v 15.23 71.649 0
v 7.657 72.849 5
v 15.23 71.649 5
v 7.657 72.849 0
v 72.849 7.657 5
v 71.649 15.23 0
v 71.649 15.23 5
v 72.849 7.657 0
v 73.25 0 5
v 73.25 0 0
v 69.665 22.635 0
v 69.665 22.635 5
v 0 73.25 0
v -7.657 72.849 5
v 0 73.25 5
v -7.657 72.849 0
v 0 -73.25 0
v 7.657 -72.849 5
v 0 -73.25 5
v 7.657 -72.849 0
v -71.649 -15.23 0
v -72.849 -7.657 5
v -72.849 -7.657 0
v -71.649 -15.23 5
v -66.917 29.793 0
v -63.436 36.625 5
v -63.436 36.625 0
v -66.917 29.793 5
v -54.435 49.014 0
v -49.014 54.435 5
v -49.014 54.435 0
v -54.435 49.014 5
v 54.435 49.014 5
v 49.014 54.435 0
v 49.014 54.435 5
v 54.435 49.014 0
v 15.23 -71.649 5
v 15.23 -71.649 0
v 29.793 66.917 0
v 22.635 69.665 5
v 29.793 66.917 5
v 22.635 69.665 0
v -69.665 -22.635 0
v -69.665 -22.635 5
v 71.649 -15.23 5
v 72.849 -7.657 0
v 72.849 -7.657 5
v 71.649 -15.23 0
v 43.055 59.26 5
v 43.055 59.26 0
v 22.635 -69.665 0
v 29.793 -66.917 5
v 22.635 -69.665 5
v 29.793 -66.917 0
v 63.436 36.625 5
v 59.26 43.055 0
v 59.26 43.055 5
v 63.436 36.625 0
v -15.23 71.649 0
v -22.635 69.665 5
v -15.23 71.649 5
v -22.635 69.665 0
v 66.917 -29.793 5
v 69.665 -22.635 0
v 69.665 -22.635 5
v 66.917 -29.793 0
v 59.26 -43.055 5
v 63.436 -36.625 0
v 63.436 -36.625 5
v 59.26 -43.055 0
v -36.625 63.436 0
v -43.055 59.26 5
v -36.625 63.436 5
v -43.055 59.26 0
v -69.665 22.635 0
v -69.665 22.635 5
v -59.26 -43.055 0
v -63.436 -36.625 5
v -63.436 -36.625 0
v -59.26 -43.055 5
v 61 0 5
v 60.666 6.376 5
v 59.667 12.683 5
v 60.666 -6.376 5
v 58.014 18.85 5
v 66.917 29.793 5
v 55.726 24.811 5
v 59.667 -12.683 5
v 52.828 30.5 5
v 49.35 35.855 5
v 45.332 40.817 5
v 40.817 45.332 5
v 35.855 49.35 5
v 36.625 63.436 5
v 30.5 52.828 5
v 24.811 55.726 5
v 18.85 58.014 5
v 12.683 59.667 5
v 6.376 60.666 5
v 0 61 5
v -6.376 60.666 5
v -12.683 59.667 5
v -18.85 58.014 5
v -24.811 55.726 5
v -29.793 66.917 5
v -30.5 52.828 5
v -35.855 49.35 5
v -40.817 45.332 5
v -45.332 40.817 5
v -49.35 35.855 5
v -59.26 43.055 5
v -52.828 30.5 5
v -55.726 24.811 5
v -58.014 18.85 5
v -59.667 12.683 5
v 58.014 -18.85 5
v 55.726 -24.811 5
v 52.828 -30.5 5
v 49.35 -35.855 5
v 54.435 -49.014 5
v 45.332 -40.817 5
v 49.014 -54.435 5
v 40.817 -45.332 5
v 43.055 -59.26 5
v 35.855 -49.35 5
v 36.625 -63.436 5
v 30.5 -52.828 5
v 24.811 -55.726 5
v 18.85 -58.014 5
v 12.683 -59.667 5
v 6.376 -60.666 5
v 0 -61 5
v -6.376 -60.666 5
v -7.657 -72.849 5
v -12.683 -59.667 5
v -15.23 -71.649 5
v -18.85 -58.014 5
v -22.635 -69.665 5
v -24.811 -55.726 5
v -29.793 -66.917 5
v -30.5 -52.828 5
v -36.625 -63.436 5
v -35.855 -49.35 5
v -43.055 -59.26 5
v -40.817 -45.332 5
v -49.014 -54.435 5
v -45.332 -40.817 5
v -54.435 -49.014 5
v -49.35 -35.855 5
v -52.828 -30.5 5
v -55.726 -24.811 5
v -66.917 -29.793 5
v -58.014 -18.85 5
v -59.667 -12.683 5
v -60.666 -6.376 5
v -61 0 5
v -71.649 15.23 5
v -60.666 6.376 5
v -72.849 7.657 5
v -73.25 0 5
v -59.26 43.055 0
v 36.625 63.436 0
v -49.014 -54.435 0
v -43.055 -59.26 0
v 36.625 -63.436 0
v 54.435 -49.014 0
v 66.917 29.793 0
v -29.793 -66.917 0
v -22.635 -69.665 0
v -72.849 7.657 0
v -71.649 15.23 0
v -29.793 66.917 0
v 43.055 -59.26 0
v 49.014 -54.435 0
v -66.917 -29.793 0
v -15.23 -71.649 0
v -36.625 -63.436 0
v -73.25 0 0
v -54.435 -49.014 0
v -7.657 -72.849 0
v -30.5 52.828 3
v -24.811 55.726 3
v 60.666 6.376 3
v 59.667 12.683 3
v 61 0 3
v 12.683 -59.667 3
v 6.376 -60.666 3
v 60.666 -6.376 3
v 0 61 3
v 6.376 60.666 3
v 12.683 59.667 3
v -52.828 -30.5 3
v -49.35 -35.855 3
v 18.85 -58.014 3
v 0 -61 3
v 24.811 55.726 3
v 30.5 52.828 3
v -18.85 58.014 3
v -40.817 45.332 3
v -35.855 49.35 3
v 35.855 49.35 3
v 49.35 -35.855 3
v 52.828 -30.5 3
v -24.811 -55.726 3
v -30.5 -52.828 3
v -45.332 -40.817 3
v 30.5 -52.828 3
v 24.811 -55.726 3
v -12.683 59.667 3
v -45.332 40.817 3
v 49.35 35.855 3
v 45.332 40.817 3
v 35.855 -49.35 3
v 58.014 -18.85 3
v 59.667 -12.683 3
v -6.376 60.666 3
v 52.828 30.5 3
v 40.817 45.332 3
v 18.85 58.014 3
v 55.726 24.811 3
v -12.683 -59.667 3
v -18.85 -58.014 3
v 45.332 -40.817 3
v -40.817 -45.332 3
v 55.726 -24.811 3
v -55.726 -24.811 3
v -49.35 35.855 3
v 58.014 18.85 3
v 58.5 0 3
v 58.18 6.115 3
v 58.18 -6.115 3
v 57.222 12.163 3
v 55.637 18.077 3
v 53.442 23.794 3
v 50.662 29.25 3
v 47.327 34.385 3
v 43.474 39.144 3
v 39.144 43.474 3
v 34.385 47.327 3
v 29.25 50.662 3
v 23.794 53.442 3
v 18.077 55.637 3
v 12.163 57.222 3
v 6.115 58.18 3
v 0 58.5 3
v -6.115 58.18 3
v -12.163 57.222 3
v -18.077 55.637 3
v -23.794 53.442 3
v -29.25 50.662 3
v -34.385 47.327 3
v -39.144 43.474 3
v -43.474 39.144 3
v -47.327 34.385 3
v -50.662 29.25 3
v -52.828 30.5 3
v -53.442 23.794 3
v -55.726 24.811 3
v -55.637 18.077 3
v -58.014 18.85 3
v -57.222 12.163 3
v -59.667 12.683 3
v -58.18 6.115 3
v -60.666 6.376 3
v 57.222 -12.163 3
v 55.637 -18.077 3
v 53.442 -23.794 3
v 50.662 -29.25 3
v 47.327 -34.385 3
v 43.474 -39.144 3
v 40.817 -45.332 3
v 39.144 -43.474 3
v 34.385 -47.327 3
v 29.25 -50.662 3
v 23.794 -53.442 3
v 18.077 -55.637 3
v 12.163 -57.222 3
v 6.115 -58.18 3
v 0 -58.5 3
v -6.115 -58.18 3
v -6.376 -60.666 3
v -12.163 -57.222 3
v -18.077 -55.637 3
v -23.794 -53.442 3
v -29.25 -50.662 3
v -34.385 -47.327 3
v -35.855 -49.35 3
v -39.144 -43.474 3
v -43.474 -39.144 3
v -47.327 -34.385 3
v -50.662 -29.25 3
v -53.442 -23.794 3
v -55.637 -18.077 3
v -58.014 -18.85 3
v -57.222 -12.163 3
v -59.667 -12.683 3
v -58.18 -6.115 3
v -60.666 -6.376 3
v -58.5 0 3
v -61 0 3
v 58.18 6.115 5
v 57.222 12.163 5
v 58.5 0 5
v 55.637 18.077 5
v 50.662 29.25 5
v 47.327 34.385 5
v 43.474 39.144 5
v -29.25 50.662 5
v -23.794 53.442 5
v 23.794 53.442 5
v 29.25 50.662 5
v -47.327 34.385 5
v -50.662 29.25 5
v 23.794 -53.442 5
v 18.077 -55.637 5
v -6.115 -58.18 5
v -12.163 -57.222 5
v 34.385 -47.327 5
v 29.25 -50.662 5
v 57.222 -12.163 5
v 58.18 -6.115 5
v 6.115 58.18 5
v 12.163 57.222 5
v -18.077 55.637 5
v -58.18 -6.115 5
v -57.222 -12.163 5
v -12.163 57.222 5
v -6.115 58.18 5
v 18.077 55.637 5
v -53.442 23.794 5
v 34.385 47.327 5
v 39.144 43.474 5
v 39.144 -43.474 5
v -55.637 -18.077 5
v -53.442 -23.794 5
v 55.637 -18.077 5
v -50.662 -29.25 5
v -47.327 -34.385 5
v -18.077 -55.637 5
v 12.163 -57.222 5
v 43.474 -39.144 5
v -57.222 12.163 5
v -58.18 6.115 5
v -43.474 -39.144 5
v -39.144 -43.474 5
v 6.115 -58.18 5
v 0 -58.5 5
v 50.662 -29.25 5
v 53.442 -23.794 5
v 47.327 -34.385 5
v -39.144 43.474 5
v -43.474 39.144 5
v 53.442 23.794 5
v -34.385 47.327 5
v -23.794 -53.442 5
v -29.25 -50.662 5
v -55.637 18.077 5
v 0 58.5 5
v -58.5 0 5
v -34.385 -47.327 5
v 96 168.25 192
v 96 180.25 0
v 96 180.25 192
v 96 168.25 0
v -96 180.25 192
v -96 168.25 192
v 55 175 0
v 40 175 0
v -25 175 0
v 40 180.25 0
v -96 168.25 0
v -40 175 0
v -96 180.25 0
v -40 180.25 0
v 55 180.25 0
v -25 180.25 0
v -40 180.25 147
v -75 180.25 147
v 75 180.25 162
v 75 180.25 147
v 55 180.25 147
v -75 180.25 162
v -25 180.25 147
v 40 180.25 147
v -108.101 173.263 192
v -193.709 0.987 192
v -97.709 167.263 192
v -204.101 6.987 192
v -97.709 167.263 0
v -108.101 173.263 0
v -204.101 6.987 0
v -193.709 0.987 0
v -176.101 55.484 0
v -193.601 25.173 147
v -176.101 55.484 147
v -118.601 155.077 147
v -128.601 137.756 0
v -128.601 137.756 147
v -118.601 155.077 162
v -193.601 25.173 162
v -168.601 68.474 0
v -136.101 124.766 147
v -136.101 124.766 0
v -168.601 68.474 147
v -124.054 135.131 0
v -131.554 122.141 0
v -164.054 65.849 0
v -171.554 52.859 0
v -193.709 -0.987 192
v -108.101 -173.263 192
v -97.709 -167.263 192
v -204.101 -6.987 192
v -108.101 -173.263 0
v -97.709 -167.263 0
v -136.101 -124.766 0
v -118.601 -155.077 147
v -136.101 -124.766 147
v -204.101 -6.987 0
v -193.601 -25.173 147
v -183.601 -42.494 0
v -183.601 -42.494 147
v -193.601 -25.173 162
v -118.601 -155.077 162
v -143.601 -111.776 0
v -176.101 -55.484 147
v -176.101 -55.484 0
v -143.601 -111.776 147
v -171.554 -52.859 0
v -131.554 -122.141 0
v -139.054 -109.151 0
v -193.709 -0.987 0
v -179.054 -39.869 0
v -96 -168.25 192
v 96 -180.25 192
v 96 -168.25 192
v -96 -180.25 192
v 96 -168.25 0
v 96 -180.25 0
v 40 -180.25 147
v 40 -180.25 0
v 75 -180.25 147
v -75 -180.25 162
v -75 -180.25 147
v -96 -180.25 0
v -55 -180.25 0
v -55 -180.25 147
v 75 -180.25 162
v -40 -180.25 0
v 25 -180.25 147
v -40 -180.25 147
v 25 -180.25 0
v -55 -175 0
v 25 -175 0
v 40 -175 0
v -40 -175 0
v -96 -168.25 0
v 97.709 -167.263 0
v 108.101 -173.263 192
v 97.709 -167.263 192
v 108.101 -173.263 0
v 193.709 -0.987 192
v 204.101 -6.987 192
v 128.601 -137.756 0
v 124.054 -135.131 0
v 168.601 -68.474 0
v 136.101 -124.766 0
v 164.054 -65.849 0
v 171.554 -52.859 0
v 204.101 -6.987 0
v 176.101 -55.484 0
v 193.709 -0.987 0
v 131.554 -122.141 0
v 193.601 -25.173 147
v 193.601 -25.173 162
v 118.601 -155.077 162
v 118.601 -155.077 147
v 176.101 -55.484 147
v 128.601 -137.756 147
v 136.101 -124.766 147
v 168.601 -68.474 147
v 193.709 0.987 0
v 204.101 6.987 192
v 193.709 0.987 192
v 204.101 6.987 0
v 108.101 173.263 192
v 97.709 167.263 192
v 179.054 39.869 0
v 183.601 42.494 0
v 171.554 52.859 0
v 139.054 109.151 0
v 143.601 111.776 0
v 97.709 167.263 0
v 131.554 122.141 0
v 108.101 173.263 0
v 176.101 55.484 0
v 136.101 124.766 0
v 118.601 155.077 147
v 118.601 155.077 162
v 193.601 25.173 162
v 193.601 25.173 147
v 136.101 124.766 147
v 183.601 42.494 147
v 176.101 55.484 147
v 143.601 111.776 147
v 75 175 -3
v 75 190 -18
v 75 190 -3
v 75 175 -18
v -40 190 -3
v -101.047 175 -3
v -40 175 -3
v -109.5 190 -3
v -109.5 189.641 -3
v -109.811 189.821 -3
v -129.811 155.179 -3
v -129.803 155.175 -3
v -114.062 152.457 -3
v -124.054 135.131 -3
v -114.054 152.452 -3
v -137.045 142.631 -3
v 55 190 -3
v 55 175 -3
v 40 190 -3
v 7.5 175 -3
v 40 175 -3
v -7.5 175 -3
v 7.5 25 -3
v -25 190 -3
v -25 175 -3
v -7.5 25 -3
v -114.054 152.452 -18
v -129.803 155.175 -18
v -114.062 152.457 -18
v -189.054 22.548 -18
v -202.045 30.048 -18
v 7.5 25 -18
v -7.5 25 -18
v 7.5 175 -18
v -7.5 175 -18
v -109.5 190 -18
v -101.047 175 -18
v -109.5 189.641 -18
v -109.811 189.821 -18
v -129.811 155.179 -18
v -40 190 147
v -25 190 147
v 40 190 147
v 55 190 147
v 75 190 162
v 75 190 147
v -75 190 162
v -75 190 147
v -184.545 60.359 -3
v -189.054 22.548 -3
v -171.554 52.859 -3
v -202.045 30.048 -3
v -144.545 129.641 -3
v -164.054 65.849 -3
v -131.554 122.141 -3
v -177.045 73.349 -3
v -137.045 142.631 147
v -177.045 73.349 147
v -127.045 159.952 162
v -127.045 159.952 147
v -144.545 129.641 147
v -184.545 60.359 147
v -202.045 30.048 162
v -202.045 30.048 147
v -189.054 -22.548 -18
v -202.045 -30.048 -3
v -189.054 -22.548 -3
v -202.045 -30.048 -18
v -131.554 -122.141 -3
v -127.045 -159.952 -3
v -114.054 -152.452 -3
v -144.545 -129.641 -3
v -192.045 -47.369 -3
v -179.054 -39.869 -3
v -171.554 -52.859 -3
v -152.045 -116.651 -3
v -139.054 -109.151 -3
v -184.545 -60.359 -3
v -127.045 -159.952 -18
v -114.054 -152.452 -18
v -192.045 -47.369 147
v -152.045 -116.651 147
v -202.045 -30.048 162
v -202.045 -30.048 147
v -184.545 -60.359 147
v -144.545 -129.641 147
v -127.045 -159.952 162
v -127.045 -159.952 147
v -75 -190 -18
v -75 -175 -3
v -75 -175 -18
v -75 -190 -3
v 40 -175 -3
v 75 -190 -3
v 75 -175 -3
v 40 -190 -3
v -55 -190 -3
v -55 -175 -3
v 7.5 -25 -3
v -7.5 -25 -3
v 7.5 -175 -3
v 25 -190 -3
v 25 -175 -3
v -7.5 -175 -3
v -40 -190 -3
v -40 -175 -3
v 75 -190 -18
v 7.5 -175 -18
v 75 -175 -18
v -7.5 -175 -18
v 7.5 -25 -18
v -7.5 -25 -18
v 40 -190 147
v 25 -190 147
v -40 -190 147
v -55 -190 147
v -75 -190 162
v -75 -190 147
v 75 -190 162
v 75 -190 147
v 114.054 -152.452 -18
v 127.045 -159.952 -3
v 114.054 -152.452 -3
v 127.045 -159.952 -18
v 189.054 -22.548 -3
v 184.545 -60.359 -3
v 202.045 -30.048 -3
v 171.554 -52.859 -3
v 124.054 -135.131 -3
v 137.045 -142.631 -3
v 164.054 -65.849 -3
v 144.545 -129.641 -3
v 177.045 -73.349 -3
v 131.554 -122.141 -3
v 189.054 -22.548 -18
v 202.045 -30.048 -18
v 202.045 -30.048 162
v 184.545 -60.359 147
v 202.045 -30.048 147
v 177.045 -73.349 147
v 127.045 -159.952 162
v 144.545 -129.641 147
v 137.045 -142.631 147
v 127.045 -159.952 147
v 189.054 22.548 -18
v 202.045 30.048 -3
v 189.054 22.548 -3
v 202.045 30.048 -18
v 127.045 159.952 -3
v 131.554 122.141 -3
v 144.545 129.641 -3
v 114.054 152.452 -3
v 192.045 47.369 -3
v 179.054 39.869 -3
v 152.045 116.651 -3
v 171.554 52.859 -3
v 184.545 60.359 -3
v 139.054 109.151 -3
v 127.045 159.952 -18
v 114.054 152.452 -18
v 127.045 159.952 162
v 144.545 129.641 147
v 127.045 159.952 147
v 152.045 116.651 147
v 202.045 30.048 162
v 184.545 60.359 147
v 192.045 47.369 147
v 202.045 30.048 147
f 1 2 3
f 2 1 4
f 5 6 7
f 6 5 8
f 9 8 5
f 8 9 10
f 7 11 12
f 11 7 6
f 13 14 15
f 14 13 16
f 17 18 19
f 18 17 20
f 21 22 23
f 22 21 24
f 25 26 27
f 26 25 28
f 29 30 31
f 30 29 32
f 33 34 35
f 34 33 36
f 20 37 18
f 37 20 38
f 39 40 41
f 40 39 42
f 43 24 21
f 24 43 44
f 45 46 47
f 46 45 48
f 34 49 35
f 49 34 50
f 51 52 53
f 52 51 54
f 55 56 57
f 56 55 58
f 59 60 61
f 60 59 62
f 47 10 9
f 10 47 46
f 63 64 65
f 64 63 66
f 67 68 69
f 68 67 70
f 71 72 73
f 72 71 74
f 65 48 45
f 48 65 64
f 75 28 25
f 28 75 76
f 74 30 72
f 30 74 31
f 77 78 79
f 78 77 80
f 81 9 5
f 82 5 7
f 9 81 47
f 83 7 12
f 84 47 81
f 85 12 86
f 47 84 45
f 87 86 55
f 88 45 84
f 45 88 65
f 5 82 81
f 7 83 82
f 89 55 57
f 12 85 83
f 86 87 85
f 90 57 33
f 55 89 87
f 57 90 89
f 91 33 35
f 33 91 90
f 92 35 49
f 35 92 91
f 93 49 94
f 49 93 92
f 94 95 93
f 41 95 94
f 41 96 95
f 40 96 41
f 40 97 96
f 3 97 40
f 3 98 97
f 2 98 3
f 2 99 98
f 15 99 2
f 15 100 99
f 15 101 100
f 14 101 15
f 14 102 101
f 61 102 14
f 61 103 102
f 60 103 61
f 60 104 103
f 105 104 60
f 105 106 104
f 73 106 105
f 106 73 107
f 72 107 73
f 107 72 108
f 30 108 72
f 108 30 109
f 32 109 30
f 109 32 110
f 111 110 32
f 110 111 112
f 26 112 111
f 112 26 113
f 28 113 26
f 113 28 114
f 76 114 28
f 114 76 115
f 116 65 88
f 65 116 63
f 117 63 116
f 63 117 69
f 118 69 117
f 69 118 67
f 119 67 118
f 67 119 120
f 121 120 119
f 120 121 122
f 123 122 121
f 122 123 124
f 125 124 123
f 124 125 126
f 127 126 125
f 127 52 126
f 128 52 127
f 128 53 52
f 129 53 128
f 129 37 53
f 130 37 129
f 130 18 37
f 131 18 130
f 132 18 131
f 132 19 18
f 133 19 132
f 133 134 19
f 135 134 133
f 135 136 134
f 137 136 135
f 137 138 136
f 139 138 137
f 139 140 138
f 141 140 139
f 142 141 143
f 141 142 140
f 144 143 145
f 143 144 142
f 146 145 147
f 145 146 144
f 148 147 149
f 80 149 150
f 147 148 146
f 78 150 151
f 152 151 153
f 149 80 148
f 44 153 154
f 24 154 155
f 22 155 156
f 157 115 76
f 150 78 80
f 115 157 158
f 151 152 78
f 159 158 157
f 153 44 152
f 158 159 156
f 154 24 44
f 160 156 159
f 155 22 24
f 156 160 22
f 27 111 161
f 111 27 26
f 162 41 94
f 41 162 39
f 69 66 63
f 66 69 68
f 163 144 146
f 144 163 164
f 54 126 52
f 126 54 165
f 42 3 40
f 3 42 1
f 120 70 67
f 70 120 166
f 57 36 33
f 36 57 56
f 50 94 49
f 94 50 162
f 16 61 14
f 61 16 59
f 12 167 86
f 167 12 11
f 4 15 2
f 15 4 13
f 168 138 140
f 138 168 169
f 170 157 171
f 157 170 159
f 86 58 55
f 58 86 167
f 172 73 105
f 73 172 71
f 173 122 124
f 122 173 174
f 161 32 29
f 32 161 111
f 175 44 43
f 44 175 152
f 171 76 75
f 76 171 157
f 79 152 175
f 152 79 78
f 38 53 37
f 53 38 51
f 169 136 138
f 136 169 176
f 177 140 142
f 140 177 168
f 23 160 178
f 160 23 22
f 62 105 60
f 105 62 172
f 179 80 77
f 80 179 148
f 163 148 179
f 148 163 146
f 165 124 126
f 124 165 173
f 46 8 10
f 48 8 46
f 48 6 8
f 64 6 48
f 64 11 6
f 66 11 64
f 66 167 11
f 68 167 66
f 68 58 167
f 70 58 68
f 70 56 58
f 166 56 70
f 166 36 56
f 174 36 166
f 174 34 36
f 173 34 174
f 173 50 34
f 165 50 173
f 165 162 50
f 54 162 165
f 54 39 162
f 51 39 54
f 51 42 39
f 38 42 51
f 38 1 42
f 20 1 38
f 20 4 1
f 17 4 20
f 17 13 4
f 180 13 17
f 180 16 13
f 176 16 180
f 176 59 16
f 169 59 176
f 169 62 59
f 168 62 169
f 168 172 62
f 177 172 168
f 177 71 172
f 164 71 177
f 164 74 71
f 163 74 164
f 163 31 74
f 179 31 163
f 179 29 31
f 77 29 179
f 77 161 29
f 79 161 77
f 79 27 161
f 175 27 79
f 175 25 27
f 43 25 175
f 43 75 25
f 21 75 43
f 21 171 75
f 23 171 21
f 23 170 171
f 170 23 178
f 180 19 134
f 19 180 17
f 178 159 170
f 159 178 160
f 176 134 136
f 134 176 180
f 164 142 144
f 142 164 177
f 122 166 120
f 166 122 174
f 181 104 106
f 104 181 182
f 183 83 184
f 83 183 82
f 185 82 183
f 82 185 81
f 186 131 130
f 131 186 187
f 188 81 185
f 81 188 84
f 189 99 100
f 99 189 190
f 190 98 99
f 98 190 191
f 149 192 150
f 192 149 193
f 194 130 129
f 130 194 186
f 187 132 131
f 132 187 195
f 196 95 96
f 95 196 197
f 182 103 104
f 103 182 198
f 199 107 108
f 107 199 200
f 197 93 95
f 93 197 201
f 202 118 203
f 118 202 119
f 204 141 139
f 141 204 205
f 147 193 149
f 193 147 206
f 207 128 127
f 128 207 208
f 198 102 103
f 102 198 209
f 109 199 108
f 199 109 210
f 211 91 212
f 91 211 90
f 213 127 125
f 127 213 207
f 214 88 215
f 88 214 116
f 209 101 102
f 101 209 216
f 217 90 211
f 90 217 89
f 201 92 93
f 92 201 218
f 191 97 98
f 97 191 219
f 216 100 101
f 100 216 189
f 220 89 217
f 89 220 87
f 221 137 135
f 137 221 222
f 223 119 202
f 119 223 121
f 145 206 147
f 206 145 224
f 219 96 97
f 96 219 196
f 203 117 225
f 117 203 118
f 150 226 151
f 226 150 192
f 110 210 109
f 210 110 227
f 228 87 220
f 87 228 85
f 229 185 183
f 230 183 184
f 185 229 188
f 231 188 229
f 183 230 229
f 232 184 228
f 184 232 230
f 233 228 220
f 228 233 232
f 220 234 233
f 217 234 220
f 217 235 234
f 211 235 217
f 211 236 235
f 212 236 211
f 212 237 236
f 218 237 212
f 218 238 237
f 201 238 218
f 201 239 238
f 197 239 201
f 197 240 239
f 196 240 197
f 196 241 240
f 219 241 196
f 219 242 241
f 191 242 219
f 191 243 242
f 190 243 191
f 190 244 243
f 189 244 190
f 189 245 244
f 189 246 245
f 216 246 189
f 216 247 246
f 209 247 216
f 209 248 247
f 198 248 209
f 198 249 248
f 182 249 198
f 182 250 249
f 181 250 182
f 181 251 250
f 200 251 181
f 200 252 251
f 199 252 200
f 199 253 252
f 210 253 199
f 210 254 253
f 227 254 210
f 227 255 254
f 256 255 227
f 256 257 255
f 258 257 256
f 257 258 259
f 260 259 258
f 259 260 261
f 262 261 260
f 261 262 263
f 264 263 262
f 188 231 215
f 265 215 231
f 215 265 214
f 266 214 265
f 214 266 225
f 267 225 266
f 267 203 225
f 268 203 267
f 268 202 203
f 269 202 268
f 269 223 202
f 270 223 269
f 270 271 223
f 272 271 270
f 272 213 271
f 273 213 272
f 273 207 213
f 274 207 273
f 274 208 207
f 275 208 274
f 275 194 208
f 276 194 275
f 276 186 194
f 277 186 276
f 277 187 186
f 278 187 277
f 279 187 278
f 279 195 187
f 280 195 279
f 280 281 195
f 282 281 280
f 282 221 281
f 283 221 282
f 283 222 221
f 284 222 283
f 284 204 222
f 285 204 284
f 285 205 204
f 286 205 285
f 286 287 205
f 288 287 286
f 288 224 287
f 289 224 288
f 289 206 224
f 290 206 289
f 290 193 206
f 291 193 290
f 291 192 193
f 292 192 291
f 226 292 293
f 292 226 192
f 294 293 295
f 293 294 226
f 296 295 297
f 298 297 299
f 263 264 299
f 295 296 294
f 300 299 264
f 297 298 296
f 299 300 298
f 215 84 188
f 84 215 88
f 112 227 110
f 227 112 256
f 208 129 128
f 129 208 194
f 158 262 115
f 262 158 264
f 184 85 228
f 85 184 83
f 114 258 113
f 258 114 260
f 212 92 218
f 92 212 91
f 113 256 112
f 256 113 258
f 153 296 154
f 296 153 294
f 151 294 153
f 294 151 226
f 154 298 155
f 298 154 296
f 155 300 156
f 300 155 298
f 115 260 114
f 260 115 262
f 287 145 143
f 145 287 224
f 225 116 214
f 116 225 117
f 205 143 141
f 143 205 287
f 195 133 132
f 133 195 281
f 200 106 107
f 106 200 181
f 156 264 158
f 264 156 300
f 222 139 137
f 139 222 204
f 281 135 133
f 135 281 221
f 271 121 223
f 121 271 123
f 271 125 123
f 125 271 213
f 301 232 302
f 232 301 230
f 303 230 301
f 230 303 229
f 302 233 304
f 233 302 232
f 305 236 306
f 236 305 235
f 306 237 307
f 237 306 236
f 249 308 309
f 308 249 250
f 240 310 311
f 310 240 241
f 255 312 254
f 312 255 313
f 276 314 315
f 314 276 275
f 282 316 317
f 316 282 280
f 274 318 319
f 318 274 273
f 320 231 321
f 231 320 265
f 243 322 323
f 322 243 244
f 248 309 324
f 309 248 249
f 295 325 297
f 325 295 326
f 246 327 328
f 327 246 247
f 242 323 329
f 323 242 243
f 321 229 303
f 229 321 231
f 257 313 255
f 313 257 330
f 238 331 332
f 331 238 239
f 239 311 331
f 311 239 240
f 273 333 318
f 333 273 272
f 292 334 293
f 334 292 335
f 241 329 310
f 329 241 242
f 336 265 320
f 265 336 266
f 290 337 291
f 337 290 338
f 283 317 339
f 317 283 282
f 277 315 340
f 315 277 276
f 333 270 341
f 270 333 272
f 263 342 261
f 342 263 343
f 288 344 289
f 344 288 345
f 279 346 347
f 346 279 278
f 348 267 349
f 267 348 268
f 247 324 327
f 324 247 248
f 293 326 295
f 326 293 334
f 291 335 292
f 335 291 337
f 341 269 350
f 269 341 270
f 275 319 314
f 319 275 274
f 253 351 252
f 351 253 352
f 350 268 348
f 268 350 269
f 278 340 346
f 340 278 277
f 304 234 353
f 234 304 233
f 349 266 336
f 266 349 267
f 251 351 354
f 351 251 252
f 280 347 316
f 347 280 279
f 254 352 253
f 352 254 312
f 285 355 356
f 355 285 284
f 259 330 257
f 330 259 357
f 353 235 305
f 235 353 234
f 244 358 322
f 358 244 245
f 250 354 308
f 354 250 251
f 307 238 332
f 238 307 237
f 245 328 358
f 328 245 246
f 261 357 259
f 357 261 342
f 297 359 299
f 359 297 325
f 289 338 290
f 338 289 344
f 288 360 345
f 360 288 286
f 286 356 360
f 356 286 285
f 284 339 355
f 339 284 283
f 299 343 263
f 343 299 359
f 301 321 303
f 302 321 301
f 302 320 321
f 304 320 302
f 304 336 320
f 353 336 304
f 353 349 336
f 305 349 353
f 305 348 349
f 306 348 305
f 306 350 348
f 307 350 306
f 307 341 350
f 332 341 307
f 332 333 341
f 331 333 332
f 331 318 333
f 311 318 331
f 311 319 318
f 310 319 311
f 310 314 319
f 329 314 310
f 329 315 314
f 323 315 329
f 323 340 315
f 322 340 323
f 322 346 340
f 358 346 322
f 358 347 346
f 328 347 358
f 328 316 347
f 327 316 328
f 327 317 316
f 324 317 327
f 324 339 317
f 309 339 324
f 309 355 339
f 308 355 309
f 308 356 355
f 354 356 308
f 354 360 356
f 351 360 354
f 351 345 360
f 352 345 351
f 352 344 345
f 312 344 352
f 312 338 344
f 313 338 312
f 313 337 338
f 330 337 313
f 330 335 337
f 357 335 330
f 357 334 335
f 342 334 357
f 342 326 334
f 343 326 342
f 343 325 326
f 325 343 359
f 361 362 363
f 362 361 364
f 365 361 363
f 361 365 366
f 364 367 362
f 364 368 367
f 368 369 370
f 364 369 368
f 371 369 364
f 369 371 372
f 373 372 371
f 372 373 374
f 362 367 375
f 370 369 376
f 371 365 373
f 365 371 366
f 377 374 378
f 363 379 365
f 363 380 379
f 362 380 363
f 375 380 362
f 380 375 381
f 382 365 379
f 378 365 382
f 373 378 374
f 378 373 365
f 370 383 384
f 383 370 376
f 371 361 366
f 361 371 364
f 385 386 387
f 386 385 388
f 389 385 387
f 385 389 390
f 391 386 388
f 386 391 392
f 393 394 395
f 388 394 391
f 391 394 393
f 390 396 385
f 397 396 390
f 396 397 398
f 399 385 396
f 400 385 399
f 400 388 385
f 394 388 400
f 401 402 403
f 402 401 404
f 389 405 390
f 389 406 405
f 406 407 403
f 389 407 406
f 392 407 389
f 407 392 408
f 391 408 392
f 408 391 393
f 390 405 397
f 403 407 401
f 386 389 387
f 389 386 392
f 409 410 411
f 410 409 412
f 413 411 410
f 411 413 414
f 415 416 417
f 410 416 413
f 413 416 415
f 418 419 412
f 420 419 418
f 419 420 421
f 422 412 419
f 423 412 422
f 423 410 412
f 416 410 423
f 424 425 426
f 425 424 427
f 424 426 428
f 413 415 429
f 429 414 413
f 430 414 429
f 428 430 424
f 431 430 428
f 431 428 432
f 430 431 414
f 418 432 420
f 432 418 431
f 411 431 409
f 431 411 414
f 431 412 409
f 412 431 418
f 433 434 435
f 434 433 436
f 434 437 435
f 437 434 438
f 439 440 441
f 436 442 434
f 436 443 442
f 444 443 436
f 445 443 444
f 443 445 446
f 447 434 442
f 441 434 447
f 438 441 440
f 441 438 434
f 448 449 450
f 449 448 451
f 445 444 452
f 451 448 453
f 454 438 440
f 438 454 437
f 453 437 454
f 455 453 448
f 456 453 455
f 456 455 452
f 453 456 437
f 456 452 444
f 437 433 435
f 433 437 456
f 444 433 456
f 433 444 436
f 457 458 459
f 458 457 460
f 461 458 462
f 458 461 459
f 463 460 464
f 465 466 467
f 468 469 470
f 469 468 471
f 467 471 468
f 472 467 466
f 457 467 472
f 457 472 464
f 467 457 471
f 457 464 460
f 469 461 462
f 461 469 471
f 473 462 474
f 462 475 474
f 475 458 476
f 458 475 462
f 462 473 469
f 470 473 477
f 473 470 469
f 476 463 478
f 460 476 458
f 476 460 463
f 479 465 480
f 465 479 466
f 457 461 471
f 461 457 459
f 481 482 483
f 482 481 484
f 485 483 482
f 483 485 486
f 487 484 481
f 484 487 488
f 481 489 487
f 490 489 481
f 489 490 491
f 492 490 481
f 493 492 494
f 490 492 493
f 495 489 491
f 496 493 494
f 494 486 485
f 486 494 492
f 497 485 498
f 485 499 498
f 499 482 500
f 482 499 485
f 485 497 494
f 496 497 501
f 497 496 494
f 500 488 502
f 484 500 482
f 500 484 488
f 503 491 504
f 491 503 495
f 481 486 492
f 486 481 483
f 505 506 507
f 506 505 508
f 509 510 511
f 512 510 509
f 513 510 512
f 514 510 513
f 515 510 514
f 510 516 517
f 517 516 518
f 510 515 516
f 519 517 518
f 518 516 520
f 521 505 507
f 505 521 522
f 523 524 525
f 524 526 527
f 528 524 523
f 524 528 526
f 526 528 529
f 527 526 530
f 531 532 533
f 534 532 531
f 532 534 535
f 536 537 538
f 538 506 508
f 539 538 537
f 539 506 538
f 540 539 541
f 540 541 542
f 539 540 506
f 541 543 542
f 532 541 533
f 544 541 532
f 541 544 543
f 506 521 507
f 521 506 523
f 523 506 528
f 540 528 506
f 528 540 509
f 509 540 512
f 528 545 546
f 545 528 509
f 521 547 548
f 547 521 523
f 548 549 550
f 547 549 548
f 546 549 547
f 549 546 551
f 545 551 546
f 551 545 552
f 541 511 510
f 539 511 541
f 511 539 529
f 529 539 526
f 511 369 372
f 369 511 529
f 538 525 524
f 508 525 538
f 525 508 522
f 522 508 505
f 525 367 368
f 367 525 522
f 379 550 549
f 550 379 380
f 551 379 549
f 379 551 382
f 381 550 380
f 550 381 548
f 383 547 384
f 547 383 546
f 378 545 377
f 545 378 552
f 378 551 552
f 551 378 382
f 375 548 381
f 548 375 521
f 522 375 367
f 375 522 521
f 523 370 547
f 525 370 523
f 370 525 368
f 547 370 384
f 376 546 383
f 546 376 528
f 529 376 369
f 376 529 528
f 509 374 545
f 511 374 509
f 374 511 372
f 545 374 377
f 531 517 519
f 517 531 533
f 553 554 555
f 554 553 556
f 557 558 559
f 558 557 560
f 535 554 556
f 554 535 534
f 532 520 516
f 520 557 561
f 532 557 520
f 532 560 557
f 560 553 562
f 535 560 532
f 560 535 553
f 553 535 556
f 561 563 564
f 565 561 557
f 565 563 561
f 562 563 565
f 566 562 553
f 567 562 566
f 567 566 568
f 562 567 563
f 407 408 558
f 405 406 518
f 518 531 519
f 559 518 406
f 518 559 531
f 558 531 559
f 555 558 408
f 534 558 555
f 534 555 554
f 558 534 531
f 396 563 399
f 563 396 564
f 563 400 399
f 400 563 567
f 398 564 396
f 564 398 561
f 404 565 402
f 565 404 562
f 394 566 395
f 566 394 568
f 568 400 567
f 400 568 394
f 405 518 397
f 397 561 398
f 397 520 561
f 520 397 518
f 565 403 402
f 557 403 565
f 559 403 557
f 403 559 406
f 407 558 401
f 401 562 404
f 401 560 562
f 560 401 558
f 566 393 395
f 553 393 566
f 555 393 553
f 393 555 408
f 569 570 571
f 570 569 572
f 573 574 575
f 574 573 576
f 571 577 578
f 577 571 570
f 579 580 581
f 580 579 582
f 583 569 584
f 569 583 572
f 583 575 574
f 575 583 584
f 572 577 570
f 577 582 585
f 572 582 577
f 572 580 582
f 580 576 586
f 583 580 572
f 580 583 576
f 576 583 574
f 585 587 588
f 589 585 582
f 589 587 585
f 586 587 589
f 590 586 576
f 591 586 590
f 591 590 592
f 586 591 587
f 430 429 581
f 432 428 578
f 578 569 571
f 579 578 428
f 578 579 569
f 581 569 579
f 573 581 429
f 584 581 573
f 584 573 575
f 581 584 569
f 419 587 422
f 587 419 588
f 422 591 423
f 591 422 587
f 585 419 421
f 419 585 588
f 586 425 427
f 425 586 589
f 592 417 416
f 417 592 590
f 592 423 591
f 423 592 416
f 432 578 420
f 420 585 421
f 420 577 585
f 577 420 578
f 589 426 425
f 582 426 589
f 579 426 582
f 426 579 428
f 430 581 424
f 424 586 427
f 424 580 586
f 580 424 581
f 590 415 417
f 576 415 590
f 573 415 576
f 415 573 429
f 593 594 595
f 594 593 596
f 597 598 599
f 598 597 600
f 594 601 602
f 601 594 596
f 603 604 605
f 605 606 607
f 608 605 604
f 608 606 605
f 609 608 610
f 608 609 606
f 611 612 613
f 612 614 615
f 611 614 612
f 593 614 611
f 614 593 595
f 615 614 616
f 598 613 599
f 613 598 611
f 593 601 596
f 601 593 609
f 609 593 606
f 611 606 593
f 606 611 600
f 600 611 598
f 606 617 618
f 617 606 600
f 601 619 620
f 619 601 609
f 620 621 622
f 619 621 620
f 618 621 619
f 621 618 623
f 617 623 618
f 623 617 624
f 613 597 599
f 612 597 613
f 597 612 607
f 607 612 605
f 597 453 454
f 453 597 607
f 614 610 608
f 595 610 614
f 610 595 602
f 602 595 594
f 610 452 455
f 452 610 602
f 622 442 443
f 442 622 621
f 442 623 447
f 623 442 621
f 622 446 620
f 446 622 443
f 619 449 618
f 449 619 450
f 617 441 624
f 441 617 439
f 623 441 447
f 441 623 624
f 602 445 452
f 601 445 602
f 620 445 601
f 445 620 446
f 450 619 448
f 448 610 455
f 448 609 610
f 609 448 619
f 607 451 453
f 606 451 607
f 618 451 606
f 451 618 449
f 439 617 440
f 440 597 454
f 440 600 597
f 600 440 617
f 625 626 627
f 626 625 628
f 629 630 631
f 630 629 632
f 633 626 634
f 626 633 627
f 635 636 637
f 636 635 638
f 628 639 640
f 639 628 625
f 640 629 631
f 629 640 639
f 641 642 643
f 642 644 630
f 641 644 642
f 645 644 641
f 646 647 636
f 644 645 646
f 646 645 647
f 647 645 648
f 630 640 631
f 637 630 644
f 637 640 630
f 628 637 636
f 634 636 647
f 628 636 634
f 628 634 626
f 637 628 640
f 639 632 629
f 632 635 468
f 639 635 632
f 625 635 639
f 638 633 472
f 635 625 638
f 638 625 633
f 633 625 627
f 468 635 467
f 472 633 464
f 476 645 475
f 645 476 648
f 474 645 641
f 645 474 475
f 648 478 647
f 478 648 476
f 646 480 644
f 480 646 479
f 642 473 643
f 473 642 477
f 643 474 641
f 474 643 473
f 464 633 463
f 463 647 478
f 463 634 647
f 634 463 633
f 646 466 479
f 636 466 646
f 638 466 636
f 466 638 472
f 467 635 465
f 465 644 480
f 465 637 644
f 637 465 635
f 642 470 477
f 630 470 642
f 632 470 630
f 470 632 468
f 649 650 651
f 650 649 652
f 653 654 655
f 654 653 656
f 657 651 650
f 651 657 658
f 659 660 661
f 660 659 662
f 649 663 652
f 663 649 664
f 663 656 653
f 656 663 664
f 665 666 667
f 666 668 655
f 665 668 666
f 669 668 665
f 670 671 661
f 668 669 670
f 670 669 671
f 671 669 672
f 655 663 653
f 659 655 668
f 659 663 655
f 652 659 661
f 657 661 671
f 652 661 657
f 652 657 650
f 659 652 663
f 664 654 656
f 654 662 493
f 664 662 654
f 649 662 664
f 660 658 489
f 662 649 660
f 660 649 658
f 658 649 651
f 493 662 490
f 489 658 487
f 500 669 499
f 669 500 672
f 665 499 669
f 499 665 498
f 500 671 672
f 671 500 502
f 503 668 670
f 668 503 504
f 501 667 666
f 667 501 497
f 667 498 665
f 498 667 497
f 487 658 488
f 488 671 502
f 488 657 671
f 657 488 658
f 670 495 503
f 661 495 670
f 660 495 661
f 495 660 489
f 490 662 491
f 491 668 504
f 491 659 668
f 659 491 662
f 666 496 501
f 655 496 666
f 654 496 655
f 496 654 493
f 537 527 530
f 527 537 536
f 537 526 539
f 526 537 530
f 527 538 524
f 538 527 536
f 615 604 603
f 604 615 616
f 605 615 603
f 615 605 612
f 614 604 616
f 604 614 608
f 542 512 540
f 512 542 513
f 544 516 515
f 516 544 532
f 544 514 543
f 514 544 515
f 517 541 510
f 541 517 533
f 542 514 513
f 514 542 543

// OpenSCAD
//Buridan paradigm///
//fly plaform v0.1//
//CC BY SA 4.0 //
// first design by Andre Maia Chagas 17/01/2025//
//units in mm //

platD = 117;
platH = 5;
platEdgeD = 146.5;//platD+8;
tolerance = 0.1;
$fn=60;
matrixL = 192;//127.7;
matrixH = 192;//127.7;

module platform(){

//make platform
difference(){
cylinder(d=platEdgeD,h=platH,$fn=60);
translate([0,0,3]){
cylinder(d=platD+5,h=2.5);
}//end translate
}//end difference
cylinder(d=platD,h=platH);
//%cylinder(d=platEdgeD+22.8,h=platH,$fn=6);

}//end module

module screens(){
for(i=[0:60:301]){
rotate([0,0,i]){
translate([-matrixL/2,platEdgeD/2+95,0]){
cube([matrixL,12,matrixH]);
        }
    }
/*
*/
}
}//end module

module sticks(){
  for(i=[0:60:301]){  
     //measuring "sticks"
    rotate([0,0,i+90])
translate([170/2,0,10]){
cube([170,10,2],center=true);
}//end translate
  
    }//end for
}//end module

module beams(){
    for(i=[0:60:301]){  
rotate([0,0,i]){
translate([-150/2,175,0]){
color("green")cube([150,15,15]);
}
translate([-150/2,175,165]){
color("green")cube([150,15,15]);
}
rotate([0,90,0]){
translate([-150-15,175,80/2]){
color("blue")cube([150,15,15]);
}
}
rotate([0,90,0]){
translate([-150-15,175,-80/2]){
color("blue")cube([150,15,15]);
}
}
}

        }//end for

        for(i=[0:180:301]){  
rotate([0,0,i+90])
translate([25,-15/2,-0]){
cube([150,15,15]);          
}//end translate

}

    }//end module

module connectors(){
translate([-179/2,155,0]){  
  translate([-40/2,40/2,0])   
color("red")cube([40,15,15]);
rotate([0,0,60]){
translate([-40/2,40/2,0]){
color("red")cube([40,15,15]);
}//end translate

}//end rotate

}//end translate
}//end module


//sticks();
platform();
screens();

translate([0,0,-18]){
beams();
connectors();
}
